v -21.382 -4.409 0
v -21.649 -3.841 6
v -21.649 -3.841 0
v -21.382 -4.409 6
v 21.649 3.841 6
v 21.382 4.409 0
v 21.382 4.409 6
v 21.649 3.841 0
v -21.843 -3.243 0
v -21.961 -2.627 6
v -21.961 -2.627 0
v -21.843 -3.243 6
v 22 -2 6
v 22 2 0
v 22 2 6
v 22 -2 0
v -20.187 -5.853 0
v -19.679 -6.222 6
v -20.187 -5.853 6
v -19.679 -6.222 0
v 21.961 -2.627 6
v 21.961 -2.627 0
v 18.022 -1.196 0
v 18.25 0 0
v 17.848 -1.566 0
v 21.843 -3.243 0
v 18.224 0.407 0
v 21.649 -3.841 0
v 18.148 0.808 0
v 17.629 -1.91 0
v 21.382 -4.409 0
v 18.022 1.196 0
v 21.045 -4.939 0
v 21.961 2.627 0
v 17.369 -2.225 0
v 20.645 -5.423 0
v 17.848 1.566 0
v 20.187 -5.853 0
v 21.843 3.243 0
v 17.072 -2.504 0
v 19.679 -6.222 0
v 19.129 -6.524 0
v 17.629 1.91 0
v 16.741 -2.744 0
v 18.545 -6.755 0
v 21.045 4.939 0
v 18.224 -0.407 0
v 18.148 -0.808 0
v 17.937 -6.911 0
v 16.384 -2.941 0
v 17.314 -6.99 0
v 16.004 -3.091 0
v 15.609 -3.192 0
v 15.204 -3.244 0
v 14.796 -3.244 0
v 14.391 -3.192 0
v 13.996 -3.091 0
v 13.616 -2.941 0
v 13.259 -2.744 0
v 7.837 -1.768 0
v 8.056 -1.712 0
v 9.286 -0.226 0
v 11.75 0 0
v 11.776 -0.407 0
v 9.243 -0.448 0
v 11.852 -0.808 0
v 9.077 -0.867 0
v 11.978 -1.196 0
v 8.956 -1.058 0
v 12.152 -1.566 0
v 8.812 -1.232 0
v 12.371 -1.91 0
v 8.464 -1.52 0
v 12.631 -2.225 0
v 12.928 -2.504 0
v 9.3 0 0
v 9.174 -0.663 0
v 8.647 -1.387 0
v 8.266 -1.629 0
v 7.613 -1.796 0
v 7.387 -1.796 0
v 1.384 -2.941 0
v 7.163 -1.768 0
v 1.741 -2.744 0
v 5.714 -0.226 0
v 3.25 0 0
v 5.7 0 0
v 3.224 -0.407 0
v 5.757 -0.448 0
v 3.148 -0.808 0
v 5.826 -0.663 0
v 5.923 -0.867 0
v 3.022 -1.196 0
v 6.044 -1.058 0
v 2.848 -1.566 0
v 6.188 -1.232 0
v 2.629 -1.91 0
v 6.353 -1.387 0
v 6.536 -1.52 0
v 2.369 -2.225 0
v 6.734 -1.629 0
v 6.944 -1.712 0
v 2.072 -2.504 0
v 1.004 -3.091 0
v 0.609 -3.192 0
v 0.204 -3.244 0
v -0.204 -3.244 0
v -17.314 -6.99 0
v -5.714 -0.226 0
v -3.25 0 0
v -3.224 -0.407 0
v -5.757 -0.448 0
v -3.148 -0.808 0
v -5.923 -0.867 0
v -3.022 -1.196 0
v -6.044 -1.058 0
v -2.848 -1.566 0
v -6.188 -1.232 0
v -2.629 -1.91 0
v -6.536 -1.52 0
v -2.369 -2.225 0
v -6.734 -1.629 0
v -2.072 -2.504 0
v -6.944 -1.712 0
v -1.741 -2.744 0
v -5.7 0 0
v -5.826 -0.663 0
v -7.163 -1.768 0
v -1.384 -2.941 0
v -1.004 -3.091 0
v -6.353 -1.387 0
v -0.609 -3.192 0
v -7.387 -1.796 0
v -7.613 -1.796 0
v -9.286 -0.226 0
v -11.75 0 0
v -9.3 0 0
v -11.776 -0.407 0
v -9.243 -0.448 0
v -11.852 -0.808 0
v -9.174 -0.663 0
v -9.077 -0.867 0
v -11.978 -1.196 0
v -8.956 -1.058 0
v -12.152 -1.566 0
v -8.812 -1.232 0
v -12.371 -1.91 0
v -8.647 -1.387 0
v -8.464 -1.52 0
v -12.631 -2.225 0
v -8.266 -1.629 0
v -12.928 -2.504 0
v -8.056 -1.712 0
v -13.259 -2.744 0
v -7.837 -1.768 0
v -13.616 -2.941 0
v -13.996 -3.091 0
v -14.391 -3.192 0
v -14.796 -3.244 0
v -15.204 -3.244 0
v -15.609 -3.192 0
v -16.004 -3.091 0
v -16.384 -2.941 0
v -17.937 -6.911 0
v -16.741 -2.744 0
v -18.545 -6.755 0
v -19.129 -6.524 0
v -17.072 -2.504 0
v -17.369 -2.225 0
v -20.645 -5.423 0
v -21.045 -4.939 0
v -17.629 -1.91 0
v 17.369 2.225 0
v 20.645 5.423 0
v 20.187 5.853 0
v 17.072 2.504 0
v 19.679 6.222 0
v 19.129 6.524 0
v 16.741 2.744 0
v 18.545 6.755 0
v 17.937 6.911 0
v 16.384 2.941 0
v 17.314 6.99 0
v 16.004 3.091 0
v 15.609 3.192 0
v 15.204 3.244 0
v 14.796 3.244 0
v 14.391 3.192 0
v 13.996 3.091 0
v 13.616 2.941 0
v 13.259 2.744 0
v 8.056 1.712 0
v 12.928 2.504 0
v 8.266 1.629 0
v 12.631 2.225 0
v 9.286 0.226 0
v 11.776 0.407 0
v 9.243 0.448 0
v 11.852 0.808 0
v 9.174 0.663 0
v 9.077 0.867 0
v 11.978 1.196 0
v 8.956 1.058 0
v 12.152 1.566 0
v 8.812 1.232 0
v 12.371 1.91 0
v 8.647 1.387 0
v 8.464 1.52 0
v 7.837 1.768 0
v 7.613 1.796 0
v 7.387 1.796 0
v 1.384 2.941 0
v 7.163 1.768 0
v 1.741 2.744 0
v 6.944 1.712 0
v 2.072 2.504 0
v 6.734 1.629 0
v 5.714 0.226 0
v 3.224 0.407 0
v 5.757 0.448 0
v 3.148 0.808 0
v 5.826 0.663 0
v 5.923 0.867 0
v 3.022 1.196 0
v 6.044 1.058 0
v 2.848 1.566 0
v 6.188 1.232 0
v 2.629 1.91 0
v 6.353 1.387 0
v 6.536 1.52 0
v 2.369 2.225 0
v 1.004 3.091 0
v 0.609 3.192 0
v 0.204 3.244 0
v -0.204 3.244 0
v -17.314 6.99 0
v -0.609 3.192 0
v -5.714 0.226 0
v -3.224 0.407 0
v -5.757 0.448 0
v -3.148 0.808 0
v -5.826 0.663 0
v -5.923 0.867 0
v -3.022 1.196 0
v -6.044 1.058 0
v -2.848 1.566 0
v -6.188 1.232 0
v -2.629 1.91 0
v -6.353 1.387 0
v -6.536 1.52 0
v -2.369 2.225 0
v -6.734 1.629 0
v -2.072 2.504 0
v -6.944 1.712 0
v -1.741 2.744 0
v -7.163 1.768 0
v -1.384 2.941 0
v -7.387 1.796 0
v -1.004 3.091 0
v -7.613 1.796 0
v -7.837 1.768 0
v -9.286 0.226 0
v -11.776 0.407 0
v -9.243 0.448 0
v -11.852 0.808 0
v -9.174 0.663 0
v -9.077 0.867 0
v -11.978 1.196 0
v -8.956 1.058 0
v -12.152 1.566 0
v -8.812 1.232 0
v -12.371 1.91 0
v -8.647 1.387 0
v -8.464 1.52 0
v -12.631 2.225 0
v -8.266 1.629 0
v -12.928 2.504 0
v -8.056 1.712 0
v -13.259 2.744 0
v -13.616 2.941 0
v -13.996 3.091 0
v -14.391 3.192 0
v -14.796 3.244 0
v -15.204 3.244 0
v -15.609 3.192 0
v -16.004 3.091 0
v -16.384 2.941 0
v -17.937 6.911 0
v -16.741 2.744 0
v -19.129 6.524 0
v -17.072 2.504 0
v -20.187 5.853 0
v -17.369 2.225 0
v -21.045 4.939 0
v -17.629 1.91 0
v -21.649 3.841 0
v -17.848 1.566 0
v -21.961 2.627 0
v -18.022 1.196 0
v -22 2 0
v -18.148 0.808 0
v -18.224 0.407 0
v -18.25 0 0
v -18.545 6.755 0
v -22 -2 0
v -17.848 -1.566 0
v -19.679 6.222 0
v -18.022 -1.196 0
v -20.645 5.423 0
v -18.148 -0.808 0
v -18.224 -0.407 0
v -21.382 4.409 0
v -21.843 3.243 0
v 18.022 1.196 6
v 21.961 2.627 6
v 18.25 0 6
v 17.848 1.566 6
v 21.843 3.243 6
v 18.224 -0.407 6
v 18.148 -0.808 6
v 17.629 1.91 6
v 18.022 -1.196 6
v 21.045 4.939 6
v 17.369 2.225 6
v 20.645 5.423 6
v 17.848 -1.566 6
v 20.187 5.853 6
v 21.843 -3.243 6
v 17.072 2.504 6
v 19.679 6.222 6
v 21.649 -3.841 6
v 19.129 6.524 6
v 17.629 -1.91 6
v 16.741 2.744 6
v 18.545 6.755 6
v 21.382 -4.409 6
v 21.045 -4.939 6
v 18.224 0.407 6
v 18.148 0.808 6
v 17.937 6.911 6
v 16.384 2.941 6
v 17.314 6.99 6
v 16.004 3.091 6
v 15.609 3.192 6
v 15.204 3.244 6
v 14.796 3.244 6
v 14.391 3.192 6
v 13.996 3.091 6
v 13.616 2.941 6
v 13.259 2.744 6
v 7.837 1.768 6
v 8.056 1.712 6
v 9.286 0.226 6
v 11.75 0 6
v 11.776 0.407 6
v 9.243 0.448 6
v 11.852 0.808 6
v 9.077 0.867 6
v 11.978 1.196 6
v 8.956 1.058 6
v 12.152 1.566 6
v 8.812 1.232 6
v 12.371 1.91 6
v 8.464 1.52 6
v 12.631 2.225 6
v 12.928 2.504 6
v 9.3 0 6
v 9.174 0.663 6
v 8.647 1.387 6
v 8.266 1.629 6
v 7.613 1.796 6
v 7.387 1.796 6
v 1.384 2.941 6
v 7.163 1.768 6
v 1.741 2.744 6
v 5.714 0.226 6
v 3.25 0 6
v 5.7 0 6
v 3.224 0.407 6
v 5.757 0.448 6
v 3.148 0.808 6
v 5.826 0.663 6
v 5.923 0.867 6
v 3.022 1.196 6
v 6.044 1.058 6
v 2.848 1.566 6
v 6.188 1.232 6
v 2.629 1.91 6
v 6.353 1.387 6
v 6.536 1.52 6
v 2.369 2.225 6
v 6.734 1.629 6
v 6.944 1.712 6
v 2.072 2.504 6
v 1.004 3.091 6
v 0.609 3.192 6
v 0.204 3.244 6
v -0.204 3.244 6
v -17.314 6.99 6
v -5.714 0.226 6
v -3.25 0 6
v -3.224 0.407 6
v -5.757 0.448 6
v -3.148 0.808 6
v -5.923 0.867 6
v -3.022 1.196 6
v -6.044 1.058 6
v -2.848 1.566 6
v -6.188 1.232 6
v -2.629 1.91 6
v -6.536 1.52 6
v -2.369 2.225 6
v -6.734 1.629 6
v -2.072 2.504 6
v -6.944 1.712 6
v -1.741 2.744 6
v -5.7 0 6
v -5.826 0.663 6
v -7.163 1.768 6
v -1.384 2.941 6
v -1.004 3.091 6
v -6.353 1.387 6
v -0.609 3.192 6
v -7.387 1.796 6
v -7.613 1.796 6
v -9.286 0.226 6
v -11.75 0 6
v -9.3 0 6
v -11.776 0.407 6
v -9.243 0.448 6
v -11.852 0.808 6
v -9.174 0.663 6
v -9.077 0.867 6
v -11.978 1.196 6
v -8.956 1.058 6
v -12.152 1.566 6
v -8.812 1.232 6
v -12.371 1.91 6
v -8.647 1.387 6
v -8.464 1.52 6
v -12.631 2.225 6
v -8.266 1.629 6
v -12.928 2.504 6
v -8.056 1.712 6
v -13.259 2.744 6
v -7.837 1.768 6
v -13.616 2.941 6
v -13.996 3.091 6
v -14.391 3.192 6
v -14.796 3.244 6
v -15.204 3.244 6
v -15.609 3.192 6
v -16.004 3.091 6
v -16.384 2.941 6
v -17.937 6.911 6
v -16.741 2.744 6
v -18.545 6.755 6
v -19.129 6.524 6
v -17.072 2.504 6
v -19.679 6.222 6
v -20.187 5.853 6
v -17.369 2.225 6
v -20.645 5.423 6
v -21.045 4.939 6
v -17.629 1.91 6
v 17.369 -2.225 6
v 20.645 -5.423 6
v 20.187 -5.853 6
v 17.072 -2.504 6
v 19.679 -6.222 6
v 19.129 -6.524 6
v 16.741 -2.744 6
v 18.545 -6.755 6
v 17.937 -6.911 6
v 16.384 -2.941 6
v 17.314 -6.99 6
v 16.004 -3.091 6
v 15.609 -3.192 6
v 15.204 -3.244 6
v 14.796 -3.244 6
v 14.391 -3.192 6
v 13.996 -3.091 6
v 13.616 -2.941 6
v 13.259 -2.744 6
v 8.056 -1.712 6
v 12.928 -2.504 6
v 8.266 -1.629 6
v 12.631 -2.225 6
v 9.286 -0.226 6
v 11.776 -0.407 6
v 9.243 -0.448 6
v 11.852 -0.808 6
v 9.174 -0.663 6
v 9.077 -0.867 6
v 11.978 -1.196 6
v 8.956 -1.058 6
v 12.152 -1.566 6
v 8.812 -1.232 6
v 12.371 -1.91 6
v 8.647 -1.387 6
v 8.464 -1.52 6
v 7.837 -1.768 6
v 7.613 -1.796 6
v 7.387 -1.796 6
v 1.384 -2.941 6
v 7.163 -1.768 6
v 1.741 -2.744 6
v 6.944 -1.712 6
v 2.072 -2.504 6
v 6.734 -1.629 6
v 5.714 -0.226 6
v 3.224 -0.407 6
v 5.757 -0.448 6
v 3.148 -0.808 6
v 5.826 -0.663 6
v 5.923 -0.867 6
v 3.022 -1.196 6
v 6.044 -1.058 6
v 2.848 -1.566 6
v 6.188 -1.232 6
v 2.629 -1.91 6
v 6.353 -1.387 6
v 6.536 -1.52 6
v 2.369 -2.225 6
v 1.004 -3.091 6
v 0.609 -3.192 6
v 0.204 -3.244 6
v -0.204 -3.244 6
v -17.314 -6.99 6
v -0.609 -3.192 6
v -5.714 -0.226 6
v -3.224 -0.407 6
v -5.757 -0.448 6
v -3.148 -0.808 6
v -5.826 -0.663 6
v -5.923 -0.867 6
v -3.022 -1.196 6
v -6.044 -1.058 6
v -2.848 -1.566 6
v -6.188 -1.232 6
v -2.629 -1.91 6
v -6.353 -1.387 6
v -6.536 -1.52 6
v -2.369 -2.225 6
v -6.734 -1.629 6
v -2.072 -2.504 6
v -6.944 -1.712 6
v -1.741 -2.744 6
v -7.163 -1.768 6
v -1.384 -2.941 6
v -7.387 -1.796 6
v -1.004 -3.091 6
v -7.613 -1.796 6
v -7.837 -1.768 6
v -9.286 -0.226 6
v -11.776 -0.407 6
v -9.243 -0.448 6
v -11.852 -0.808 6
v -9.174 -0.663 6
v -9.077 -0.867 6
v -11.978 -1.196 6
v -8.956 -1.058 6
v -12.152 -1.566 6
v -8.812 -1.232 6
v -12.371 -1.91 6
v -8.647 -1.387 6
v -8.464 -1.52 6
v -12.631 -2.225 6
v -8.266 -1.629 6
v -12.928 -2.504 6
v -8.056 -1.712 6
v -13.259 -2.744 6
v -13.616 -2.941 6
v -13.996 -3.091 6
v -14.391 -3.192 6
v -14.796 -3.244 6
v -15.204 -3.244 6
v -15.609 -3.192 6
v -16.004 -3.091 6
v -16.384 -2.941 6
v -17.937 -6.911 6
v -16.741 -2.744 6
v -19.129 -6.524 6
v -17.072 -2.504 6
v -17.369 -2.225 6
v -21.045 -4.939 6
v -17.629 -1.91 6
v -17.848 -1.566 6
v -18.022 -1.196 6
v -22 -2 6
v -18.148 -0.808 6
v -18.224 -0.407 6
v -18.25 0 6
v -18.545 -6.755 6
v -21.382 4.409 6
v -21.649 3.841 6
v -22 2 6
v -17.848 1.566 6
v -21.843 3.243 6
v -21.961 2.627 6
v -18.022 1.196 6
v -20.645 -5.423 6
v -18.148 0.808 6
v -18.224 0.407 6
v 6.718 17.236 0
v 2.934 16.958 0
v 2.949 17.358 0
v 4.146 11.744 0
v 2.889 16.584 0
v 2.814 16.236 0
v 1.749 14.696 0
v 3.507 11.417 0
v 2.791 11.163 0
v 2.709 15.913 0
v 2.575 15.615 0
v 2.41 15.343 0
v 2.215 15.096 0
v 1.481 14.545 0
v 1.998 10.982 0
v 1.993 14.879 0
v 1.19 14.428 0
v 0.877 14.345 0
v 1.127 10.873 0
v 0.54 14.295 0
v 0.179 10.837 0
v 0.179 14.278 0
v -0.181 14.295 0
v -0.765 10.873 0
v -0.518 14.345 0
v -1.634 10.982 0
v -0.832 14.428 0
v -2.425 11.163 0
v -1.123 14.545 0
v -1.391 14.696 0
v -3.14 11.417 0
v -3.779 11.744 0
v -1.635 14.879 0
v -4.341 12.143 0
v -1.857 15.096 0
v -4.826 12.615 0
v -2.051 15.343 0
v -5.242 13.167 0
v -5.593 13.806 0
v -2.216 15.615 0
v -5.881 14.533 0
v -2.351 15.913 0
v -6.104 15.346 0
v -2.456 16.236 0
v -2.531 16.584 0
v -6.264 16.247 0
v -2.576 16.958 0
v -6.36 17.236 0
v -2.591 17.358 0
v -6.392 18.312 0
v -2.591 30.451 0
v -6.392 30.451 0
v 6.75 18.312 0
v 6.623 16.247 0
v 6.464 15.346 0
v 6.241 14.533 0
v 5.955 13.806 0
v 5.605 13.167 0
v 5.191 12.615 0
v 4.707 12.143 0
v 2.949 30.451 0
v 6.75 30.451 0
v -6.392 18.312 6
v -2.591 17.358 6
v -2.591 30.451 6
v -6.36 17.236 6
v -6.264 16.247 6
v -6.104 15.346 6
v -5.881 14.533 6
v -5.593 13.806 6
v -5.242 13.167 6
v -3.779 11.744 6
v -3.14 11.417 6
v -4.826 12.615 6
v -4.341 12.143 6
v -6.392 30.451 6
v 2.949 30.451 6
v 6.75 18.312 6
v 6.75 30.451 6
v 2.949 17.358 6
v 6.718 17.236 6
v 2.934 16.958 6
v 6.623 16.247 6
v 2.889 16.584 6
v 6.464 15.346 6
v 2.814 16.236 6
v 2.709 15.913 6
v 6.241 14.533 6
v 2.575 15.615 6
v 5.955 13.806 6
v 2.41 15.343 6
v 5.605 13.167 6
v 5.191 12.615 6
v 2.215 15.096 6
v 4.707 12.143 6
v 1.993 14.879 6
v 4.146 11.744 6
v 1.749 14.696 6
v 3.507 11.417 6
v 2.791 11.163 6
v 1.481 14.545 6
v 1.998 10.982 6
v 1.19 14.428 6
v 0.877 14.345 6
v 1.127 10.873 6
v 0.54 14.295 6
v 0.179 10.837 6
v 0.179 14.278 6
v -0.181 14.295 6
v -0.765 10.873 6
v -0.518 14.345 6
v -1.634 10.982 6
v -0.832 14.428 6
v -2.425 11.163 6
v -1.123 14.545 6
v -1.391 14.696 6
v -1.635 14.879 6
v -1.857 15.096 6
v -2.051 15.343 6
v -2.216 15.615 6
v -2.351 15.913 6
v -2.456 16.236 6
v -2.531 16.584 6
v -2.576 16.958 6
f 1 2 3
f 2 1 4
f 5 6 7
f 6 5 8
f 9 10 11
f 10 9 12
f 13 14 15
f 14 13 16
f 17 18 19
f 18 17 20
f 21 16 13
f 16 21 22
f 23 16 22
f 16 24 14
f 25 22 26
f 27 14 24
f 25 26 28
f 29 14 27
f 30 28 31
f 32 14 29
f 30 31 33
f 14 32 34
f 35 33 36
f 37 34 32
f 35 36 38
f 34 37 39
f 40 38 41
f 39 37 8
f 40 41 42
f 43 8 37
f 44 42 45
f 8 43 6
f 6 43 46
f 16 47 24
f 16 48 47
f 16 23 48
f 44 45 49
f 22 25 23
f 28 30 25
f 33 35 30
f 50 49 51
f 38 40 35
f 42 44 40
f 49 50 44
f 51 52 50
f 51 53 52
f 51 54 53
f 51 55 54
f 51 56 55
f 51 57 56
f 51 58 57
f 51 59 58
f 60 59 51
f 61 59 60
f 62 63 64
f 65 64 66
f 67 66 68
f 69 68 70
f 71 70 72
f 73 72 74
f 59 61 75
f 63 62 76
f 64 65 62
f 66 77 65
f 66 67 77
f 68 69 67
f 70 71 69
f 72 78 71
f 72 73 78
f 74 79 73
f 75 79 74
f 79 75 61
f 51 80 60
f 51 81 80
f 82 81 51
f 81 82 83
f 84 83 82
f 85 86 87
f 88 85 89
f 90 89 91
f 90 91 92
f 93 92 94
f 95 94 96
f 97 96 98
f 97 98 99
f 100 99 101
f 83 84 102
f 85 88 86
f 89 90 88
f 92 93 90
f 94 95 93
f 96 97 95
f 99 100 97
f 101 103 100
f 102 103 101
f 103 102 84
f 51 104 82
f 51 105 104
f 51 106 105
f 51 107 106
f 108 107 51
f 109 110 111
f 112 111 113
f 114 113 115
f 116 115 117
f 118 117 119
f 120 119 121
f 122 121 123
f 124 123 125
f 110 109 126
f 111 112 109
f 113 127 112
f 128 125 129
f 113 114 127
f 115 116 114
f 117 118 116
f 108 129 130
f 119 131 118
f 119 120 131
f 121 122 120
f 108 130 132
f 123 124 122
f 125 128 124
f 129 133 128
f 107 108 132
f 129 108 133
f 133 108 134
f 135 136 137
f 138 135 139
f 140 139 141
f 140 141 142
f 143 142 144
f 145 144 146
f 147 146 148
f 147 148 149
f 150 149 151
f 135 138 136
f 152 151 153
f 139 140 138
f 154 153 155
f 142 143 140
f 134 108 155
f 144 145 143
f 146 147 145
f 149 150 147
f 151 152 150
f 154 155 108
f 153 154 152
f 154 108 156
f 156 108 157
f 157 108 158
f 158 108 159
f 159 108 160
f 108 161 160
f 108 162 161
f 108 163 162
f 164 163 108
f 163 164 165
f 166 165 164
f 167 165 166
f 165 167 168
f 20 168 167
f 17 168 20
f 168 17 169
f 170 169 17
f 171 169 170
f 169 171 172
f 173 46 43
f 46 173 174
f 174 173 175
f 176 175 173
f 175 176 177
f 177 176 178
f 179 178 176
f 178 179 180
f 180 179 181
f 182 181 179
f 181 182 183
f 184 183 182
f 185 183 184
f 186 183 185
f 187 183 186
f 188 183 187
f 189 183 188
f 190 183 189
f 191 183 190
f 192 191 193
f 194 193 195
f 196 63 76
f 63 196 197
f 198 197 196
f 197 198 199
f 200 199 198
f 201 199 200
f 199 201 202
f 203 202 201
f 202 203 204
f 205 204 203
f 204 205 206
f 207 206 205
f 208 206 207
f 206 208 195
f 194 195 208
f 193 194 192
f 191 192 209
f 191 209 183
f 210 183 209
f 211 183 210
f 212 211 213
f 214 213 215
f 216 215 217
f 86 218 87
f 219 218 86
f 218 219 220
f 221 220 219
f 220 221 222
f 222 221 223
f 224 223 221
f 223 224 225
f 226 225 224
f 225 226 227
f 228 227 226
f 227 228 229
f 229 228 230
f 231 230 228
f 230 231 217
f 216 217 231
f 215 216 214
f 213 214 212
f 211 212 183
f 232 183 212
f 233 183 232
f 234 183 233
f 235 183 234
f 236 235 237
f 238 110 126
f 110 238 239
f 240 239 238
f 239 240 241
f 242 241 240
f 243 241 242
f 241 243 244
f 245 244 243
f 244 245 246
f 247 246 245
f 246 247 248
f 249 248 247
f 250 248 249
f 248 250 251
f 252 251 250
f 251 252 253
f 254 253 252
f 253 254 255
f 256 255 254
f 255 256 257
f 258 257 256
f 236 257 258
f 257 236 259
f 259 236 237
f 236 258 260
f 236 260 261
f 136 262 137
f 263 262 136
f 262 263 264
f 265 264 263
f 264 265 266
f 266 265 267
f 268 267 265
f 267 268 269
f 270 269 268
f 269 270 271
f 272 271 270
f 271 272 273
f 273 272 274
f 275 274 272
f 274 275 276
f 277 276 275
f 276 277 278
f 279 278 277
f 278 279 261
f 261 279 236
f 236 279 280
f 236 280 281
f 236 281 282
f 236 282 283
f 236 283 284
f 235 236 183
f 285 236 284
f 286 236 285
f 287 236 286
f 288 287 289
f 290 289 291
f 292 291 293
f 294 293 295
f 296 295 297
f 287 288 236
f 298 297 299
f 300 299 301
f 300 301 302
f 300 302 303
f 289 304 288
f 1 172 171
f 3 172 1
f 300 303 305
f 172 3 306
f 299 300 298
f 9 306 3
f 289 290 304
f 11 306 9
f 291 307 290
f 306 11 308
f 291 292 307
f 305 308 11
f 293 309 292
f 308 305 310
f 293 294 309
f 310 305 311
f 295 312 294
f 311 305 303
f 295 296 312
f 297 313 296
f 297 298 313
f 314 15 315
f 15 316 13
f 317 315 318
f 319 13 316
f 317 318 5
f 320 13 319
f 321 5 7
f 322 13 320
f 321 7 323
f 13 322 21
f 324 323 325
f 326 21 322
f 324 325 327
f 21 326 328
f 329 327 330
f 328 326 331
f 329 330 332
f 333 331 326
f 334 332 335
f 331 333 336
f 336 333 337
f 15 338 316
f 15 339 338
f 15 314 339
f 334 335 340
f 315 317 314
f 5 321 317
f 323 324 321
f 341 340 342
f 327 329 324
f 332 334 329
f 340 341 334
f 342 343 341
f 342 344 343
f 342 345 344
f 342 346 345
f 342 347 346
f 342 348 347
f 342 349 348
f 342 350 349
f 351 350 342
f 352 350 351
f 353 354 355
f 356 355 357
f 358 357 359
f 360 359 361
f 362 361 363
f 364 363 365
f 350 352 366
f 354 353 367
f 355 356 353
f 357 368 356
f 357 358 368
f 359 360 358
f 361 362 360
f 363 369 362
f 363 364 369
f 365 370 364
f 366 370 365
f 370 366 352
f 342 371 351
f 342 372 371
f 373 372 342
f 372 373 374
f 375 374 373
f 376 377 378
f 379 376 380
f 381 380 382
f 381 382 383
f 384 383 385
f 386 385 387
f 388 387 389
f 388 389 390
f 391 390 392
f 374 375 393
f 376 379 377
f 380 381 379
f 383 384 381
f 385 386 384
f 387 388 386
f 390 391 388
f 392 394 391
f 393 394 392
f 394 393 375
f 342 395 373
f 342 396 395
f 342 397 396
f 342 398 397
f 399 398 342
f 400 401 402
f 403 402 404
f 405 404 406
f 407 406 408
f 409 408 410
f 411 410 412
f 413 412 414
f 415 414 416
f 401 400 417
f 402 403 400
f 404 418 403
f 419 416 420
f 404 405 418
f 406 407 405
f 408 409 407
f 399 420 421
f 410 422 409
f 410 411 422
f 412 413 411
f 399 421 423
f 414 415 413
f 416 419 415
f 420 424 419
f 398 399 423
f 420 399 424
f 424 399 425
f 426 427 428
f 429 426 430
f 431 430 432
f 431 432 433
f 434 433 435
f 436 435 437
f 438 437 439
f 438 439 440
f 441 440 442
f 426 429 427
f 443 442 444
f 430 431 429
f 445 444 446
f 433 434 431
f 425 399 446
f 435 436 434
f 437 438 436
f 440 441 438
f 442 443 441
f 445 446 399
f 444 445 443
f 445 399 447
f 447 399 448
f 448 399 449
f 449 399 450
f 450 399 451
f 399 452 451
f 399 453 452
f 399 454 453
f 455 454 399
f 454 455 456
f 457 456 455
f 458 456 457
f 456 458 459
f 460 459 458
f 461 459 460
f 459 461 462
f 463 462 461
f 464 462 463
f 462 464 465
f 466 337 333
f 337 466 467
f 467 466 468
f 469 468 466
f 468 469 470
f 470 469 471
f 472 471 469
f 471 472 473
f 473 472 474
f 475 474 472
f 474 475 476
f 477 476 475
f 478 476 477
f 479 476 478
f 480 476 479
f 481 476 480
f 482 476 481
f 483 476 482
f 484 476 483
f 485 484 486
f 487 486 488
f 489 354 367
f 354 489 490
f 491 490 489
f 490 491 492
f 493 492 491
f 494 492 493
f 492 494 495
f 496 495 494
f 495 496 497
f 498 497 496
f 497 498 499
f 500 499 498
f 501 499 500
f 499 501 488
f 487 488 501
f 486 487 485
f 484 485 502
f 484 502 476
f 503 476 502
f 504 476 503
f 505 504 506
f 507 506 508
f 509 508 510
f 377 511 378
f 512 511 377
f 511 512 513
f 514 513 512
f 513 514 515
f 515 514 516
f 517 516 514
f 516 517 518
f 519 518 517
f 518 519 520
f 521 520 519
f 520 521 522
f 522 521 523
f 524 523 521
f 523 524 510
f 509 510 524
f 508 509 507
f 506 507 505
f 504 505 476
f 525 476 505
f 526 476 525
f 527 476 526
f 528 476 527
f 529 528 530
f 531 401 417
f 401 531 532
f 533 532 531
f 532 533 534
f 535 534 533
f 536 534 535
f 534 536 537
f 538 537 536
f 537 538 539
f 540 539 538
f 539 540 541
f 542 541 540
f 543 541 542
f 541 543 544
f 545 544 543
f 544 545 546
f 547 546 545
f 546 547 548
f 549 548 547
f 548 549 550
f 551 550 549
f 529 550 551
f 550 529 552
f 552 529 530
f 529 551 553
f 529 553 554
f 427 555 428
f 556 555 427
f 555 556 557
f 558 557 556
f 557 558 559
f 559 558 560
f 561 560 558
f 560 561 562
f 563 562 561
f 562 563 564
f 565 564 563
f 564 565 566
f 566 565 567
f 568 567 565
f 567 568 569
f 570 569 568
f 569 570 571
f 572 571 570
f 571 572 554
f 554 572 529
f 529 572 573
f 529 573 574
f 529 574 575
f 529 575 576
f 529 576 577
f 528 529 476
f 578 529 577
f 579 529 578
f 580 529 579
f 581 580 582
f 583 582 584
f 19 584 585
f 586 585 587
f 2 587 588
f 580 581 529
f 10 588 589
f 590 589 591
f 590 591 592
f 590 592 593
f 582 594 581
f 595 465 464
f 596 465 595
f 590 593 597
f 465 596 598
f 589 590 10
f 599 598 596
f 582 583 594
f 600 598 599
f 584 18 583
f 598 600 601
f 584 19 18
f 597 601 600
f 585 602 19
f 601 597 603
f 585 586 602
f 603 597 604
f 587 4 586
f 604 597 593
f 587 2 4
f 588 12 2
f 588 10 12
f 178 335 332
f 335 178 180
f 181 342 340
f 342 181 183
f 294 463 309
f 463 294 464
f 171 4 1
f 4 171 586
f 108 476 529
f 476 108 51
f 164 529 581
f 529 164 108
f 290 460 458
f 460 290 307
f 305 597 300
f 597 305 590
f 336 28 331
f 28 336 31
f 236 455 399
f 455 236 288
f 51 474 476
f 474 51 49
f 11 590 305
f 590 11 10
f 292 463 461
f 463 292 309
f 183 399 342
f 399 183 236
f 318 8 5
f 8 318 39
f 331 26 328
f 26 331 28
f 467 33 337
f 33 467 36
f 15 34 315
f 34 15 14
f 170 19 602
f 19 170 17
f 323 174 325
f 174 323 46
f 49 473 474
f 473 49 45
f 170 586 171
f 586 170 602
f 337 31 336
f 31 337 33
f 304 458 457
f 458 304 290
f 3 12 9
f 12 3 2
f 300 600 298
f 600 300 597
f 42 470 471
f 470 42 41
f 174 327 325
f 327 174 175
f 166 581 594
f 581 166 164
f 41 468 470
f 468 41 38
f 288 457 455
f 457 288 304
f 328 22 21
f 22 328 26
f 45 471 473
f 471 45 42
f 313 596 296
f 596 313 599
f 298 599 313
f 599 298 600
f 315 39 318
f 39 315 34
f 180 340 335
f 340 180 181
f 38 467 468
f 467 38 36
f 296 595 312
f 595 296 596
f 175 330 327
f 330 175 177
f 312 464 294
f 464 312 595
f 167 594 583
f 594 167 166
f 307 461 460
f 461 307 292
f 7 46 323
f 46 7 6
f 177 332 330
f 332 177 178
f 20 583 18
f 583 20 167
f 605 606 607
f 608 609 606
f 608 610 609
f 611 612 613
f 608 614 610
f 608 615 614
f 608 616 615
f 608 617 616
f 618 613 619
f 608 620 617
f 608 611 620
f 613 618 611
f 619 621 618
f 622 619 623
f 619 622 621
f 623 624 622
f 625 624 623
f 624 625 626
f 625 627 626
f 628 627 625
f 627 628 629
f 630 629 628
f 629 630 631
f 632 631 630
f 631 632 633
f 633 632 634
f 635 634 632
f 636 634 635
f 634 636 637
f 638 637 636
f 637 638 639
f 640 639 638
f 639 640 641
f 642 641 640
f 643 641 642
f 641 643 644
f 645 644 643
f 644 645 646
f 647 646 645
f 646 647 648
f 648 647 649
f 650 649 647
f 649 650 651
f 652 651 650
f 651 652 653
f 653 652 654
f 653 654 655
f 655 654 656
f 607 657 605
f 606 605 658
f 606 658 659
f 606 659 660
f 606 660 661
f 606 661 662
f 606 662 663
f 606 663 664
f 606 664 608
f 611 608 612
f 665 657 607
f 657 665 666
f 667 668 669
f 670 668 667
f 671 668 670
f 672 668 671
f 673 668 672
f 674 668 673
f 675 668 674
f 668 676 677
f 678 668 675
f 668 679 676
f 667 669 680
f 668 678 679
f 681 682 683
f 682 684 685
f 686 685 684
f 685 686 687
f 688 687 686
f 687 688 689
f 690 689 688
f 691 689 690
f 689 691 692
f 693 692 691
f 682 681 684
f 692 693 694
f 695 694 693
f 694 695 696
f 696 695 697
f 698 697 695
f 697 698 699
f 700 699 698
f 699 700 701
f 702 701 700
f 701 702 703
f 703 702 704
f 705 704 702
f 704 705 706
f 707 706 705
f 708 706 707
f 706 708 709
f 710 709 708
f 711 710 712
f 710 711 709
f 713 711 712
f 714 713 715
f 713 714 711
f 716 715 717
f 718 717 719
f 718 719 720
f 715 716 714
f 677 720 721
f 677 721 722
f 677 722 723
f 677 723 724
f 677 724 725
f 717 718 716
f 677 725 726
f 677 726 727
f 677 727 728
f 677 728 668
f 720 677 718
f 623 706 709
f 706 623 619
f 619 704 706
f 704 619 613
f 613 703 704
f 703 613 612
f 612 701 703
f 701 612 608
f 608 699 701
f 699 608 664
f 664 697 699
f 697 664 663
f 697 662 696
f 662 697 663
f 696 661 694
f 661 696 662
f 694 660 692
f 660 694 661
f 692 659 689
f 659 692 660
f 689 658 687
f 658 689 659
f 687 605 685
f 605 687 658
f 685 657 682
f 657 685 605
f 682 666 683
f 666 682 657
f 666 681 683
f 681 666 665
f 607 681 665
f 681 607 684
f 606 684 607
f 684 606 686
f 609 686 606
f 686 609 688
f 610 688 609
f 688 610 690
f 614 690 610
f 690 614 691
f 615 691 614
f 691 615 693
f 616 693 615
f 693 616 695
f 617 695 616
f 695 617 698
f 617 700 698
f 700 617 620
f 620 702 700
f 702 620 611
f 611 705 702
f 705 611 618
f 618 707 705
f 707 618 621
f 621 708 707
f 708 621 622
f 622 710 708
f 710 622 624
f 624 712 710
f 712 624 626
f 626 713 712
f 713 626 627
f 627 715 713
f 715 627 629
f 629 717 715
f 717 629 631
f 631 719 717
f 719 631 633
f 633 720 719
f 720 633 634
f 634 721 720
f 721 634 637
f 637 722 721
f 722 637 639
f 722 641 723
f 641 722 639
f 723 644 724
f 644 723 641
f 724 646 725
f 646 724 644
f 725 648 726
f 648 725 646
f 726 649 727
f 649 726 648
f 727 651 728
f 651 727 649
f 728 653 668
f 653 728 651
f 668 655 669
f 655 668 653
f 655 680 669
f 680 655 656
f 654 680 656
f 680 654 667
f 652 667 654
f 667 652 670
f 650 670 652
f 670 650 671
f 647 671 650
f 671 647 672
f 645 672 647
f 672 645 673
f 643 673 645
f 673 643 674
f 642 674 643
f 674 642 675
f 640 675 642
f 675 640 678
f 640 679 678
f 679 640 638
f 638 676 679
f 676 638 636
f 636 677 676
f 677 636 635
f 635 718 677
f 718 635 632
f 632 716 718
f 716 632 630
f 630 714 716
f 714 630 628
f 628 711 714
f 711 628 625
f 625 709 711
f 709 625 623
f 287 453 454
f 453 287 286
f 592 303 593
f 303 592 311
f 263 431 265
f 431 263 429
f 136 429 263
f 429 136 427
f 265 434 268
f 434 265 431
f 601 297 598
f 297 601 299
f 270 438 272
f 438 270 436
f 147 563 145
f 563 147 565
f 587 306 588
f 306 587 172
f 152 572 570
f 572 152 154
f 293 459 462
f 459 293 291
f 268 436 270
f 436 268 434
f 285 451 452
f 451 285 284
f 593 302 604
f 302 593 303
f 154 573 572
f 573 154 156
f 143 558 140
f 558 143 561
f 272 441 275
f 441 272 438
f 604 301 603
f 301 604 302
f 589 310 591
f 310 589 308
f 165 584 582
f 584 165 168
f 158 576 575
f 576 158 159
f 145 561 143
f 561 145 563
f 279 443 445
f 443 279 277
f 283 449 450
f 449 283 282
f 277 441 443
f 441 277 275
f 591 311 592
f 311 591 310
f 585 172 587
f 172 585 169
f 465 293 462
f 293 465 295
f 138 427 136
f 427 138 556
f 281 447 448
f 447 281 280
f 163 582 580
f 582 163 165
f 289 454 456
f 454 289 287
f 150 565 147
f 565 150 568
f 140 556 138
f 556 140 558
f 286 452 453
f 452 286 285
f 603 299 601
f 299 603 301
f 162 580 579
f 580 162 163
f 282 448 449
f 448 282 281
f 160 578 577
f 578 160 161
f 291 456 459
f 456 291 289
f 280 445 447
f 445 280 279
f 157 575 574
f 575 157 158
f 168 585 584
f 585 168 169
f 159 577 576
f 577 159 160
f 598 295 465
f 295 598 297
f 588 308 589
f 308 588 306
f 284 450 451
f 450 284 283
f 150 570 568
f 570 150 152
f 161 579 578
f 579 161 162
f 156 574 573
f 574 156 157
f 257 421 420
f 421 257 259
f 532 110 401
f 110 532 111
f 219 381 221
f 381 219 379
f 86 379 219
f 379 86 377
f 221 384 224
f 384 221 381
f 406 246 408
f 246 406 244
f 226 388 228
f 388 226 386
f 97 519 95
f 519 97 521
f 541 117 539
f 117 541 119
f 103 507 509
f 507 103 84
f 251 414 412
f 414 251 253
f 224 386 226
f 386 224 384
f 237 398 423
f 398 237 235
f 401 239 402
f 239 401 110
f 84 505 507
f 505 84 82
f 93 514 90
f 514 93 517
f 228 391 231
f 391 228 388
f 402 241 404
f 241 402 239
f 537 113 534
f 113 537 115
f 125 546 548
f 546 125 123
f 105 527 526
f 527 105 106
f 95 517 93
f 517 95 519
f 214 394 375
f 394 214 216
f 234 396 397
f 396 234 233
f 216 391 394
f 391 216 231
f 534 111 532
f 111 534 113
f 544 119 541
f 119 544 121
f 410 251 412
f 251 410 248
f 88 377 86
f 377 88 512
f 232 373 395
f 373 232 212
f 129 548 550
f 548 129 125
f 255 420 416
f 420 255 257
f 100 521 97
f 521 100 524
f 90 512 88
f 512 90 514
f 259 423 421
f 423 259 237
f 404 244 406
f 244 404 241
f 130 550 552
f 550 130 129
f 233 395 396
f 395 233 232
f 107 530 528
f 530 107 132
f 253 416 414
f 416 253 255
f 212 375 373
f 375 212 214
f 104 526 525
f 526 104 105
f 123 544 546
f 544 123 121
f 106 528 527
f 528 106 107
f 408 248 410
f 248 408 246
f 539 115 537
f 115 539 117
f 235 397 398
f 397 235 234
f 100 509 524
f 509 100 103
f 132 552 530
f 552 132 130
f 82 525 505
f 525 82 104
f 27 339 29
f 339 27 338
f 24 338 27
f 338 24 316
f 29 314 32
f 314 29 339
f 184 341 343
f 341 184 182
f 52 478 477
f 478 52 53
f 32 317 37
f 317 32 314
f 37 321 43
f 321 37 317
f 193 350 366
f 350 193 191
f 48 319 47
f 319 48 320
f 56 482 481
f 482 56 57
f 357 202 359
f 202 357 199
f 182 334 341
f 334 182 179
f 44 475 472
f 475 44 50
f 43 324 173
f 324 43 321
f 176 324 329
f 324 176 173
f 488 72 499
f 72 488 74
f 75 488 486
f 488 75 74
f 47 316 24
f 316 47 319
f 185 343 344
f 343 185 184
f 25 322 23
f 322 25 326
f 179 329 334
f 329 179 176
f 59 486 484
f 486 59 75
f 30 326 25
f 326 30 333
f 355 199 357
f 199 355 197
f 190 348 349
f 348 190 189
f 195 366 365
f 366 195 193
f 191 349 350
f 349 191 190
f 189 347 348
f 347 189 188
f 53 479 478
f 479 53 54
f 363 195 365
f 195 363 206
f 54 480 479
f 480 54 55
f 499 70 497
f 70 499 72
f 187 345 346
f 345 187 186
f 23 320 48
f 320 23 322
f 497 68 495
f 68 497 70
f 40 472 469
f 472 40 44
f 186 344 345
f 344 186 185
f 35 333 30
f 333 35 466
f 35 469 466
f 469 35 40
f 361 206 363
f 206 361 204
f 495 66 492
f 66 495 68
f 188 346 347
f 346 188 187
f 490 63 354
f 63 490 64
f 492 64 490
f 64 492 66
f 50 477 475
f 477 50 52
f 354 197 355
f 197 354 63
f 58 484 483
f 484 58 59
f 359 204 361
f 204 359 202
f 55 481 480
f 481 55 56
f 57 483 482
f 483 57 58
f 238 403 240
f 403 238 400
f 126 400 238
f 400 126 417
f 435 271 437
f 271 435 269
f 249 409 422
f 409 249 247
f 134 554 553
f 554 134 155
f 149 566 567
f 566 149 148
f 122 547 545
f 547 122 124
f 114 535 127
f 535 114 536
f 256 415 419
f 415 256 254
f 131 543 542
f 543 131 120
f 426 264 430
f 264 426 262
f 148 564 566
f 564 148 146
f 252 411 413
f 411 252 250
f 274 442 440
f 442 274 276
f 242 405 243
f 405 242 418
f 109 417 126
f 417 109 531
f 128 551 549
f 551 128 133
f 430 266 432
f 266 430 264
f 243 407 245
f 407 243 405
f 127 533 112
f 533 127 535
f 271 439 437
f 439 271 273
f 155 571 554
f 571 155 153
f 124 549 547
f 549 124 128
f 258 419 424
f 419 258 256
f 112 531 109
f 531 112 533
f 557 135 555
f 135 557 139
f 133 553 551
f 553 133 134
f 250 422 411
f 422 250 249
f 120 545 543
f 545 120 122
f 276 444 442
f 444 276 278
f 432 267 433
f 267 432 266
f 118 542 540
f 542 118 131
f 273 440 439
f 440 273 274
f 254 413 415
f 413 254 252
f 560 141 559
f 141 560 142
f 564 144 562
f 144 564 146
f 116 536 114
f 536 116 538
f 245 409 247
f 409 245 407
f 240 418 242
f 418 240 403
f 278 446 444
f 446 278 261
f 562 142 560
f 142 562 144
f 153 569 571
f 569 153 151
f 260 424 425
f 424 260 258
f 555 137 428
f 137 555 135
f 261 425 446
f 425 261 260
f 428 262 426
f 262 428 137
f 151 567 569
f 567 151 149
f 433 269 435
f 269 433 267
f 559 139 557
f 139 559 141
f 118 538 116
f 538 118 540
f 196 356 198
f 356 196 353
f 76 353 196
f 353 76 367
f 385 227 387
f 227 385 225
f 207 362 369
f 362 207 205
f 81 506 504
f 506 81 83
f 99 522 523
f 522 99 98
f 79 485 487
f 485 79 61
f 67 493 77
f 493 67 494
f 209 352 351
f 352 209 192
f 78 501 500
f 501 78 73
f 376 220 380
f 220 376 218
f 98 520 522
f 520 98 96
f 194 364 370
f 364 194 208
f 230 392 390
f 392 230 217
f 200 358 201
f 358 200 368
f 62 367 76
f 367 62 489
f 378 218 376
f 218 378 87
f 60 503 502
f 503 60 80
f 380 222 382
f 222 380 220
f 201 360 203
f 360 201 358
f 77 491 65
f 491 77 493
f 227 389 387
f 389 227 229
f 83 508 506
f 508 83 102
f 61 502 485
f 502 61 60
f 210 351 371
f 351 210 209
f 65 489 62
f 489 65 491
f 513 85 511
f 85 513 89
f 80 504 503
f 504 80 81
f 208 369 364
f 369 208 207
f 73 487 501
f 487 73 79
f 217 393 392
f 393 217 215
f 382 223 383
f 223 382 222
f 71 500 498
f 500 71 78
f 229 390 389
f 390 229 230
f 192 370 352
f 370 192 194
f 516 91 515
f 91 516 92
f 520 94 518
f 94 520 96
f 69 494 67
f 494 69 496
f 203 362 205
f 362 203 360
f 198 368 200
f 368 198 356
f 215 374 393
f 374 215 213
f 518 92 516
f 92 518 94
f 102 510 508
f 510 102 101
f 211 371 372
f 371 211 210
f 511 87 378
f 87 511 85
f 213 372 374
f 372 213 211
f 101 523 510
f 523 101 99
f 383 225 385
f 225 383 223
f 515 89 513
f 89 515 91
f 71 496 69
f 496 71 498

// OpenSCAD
$fn = 50;


difference() {
	union() {
		hull() {
			translate(v = [-17.0000000000, 2.0000000000, 0]) {
				cylinder(h = 6, r = 5);
			}
			translate(v = [17.0000000000, 2.0000000000, 0]) {
				cylinder(h = 6, r = 5);
			}
			translate(v = [-17.0000000000, -2.0000000000, 0]) {
				cylinder(h = 6, r = 5);
			}
			translate(v = [17.0000000000, -2.0000000000, 0]) {
				cylinder(h = 6, r = 5);
			}
		}
		translate(v = [0, 30.0000000000, 0]) {
			linear_extrude(height = 6) {
				text(font = "DejaVu Sans Mono:style=Bold", halign = "center", size = 19.0000000000, text = "U", valign = "top");
			}
		}
	}
	union() {
		translate(v = [-15.0000000000, 0.0000000000, 0]) {
			translate(v = [0, 0, -100]) {
				cylinder(h = 200, r = 3.2500000000);
			}
		}
		translate(v = [0, 0, -100]) {
			cylinder(h = 200, r = 3.2500000000);
		}
		translate(v = [15.0000000000, 0.0000000000, 0]) {
			translate(v = [0, 0, -100]) {
				cylinder(h = 200, r = 3.2500000000);
			}
		}
		translate(v = [-15.0000000000, 0.0000000000, 0]) {
			translate(v = [0, 0, -100]) {
				cylinder(h = 200, r = 1.8000000000);
			}
		}
		translate(v = [-7.5000000000, 0.0000000000, 0]) {
			translate(v = [0, 0, -100]) {
				cylinder(h = 200, r = 1.8000000000);
			}
		}
		translate(v = [0, 0, -100]) {
			cylinder(h = 200, r = 1.8000000000);
		}
		translate(v = [7.5000000000, 0.0000000000, 0]) {
			translate(v = [0, 0, -100]) {
				cylinder(h = 200, r = 1.8000000000);
			}
		}
		translate(v = [15.0000000000, 0.0000000000, 0]) {
			translate(v = [0, 0, -100]) {
				cylinder(h = 200, r = 1.8000000000);
			}
		}
	}
}
